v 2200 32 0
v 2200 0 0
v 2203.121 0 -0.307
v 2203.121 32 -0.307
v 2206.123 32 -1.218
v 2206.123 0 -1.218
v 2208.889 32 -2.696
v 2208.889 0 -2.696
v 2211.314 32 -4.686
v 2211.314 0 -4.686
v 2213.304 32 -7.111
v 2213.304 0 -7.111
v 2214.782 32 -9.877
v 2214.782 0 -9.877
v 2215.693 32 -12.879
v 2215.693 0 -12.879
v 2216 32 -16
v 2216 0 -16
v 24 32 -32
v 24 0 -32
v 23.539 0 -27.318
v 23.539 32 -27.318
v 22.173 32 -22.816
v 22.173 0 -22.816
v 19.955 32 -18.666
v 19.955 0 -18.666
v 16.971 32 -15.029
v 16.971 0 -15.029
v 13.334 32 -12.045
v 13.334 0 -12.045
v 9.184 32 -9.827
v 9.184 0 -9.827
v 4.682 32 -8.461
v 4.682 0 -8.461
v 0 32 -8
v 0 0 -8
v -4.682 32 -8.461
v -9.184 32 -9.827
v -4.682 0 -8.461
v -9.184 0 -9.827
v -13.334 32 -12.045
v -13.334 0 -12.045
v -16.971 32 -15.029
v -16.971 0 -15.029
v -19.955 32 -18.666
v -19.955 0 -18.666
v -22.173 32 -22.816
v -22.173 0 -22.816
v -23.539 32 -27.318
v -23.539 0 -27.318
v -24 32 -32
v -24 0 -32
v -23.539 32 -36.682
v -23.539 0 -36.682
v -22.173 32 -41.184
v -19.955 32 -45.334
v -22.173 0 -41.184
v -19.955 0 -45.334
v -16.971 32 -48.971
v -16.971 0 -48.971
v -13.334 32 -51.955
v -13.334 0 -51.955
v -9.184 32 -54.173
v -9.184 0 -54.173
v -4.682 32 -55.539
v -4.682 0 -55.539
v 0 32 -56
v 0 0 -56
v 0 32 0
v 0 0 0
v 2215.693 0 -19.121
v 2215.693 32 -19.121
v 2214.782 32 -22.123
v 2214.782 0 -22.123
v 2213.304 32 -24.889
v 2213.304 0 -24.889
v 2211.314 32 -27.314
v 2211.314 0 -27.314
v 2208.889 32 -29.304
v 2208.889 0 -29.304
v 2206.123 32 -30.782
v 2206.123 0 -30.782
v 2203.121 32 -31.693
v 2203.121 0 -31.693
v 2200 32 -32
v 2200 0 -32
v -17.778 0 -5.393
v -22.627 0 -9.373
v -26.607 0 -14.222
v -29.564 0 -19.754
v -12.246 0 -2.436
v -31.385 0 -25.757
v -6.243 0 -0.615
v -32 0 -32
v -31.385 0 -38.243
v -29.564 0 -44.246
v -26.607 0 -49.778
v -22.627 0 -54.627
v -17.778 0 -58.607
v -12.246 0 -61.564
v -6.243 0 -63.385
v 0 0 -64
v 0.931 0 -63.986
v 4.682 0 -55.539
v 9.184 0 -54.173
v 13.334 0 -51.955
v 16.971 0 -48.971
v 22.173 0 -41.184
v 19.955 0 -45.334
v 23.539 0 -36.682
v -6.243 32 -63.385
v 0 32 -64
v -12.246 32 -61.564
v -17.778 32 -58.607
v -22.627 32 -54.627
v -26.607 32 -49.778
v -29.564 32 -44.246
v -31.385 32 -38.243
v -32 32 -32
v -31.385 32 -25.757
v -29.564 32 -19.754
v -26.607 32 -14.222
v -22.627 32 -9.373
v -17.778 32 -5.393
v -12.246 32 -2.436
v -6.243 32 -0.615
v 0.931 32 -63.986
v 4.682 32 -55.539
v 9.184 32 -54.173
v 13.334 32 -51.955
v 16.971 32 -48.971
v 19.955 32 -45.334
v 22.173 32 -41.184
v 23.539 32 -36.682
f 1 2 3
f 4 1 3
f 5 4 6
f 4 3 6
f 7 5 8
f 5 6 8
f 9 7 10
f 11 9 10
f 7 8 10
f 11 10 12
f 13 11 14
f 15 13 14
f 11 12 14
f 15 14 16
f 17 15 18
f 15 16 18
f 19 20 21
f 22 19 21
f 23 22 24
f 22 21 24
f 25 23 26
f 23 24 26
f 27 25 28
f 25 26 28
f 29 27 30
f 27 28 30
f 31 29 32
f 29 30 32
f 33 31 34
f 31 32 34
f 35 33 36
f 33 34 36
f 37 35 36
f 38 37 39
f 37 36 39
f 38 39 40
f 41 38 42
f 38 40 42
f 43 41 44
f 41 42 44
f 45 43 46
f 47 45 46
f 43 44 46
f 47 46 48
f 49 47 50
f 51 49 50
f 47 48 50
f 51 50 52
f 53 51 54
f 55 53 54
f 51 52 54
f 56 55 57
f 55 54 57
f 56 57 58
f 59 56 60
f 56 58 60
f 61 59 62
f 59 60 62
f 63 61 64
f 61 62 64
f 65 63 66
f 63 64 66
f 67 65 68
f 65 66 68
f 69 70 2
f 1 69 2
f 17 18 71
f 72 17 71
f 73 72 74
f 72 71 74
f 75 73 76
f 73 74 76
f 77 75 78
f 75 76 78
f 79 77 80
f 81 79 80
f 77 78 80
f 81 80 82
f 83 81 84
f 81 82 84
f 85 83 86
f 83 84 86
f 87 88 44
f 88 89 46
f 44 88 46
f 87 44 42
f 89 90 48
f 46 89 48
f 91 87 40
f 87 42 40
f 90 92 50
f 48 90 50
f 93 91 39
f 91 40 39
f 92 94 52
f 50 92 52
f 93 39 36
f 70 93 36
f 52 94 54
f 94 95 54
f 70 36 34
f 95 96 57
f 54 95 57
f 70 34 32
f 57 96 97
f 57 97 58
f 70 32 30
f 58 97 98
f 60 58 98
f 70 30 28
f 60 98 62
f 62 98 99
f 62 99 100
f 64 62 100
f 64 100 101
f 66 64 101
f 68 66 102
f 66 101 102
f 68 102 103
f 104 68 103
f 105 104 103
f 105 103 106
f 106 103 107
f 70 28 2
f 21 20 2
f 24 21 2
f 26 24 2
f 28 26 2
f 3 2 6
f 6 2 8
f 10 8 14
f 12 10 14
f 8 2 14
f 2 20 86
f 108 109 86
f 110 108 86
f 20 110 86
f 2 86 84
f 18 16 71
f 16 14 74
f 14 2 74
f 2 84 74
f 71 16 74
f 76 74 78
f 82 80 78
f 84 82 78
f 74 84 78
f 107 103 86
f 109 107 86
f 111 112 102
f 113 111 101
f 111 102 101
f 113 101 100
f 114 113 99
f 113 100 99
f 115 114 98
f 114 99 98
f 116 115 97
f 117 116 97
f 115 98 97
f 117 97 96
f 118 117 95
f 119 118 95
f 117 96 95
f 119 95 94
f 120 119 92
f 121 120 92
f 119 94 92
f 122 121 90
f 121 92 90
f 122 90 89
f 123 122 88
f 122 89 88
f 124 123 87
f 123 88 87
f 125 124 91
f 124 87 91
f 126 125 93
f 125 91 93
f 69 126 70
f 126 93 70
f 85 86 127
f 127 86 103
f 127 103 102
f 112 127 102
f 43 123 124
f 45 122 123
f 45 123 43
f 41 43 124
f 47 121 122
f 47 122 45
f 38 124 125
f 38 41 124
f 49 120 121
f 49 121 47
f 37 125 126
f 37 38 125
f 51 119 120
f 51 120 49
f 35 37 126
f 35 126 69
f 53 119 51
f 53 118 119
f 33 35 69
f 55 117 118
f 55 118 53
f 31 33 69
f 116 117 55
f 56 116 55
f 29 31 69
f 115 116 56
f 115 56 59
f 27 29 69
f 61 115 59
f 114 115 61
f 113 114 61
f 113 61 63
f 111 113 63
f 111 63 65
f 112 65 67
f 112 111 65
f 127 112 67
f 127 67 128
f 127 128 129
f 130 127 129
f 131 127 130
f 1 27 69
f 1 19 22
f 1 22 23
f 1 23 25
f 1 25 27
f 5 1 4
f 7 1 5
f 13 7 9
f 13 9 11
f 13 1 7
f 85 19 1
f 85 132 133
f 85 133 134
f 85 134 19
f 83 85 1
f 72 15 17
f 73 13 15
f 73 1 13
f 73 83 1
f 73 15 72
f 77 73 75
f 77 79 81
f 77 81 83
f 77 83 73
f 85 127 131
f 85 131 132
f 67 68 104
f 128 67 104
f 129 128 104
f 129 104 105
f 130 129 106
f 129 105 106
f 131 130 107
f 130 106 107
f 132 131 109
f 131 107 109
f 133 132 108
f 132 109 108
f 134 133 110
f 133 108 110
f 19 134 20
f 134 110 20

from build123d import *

# Parameters (mm, degrees)
BOSS_EXTRUDE1_DEPTH = 32


with BuildPart() as part:
    # Sketch1 → Boss-Extrude1 (new body)
    with BuildSketch(Plane(origin=(0, 0, 0), x_dir=(1, 0, 0), z_dir=(0, 1, 0))):
        with BuildLine():
            ThreePointArc((0, 64), (-32, 32), (0, 0))
            Line((0, 0), (0, 8))
            ThreePointArc((0, 8), (-24, 32), (0, 56))
            Line((0, 56), (0, 64))
        make_face()
        with BuildLine():
            Line((0, 8), (0, 0))
            ThreePointArc((0, 0), (22.627416998, 9.372583002), (32, 32))
            ThreePointArc((32, 32), (22.954114988, 54.295932479), (0.93071218, 63.986462368))
            Line((0.93071218, 63.986462368), (0, 64))
            Line((0, 64), (0, 56))
            ThreePointArc((0, 56), (16.970562748, 48.970562748), (24, 32))
            ThreePointArc((24, 32), (16.970562748, 15.029437252), (0, 8))
        make_face()
        with BuildLine():
            ThreePointArc((32, 32), (22.627416998, 9.372583002), (0, 0))
            Line((0, 0), (2200, 0))
            ThreePointArc((2200, 0), (2184, 16), (2200, 32))
            Line((2200, 32), (0.93071218, 63.986462368))
            ThreePointArc((0.93071218, 63.986462368), (22.954114988, 54.295932479), (32, 32))
        make_face()
        with BuildLine():
            ThreePointArc((2200, 32), (2184, 16), (2200, 0))
            Line((2200, 0), (2200, 32))
        make_face()
        with BuildLine():
            Line((2200, 32), (2200, 0))
            ThreePointArc((2200, 0), (2211.313708499, 4.686291501), (2216, 16))
            ThreePointArc((2216, 16), (2211.313708499, 27.313708499), (2200, 32))
        make_face()
    extrude(amount=BOSS_EXTRUDE1_DEPTH)


solid = part.part
